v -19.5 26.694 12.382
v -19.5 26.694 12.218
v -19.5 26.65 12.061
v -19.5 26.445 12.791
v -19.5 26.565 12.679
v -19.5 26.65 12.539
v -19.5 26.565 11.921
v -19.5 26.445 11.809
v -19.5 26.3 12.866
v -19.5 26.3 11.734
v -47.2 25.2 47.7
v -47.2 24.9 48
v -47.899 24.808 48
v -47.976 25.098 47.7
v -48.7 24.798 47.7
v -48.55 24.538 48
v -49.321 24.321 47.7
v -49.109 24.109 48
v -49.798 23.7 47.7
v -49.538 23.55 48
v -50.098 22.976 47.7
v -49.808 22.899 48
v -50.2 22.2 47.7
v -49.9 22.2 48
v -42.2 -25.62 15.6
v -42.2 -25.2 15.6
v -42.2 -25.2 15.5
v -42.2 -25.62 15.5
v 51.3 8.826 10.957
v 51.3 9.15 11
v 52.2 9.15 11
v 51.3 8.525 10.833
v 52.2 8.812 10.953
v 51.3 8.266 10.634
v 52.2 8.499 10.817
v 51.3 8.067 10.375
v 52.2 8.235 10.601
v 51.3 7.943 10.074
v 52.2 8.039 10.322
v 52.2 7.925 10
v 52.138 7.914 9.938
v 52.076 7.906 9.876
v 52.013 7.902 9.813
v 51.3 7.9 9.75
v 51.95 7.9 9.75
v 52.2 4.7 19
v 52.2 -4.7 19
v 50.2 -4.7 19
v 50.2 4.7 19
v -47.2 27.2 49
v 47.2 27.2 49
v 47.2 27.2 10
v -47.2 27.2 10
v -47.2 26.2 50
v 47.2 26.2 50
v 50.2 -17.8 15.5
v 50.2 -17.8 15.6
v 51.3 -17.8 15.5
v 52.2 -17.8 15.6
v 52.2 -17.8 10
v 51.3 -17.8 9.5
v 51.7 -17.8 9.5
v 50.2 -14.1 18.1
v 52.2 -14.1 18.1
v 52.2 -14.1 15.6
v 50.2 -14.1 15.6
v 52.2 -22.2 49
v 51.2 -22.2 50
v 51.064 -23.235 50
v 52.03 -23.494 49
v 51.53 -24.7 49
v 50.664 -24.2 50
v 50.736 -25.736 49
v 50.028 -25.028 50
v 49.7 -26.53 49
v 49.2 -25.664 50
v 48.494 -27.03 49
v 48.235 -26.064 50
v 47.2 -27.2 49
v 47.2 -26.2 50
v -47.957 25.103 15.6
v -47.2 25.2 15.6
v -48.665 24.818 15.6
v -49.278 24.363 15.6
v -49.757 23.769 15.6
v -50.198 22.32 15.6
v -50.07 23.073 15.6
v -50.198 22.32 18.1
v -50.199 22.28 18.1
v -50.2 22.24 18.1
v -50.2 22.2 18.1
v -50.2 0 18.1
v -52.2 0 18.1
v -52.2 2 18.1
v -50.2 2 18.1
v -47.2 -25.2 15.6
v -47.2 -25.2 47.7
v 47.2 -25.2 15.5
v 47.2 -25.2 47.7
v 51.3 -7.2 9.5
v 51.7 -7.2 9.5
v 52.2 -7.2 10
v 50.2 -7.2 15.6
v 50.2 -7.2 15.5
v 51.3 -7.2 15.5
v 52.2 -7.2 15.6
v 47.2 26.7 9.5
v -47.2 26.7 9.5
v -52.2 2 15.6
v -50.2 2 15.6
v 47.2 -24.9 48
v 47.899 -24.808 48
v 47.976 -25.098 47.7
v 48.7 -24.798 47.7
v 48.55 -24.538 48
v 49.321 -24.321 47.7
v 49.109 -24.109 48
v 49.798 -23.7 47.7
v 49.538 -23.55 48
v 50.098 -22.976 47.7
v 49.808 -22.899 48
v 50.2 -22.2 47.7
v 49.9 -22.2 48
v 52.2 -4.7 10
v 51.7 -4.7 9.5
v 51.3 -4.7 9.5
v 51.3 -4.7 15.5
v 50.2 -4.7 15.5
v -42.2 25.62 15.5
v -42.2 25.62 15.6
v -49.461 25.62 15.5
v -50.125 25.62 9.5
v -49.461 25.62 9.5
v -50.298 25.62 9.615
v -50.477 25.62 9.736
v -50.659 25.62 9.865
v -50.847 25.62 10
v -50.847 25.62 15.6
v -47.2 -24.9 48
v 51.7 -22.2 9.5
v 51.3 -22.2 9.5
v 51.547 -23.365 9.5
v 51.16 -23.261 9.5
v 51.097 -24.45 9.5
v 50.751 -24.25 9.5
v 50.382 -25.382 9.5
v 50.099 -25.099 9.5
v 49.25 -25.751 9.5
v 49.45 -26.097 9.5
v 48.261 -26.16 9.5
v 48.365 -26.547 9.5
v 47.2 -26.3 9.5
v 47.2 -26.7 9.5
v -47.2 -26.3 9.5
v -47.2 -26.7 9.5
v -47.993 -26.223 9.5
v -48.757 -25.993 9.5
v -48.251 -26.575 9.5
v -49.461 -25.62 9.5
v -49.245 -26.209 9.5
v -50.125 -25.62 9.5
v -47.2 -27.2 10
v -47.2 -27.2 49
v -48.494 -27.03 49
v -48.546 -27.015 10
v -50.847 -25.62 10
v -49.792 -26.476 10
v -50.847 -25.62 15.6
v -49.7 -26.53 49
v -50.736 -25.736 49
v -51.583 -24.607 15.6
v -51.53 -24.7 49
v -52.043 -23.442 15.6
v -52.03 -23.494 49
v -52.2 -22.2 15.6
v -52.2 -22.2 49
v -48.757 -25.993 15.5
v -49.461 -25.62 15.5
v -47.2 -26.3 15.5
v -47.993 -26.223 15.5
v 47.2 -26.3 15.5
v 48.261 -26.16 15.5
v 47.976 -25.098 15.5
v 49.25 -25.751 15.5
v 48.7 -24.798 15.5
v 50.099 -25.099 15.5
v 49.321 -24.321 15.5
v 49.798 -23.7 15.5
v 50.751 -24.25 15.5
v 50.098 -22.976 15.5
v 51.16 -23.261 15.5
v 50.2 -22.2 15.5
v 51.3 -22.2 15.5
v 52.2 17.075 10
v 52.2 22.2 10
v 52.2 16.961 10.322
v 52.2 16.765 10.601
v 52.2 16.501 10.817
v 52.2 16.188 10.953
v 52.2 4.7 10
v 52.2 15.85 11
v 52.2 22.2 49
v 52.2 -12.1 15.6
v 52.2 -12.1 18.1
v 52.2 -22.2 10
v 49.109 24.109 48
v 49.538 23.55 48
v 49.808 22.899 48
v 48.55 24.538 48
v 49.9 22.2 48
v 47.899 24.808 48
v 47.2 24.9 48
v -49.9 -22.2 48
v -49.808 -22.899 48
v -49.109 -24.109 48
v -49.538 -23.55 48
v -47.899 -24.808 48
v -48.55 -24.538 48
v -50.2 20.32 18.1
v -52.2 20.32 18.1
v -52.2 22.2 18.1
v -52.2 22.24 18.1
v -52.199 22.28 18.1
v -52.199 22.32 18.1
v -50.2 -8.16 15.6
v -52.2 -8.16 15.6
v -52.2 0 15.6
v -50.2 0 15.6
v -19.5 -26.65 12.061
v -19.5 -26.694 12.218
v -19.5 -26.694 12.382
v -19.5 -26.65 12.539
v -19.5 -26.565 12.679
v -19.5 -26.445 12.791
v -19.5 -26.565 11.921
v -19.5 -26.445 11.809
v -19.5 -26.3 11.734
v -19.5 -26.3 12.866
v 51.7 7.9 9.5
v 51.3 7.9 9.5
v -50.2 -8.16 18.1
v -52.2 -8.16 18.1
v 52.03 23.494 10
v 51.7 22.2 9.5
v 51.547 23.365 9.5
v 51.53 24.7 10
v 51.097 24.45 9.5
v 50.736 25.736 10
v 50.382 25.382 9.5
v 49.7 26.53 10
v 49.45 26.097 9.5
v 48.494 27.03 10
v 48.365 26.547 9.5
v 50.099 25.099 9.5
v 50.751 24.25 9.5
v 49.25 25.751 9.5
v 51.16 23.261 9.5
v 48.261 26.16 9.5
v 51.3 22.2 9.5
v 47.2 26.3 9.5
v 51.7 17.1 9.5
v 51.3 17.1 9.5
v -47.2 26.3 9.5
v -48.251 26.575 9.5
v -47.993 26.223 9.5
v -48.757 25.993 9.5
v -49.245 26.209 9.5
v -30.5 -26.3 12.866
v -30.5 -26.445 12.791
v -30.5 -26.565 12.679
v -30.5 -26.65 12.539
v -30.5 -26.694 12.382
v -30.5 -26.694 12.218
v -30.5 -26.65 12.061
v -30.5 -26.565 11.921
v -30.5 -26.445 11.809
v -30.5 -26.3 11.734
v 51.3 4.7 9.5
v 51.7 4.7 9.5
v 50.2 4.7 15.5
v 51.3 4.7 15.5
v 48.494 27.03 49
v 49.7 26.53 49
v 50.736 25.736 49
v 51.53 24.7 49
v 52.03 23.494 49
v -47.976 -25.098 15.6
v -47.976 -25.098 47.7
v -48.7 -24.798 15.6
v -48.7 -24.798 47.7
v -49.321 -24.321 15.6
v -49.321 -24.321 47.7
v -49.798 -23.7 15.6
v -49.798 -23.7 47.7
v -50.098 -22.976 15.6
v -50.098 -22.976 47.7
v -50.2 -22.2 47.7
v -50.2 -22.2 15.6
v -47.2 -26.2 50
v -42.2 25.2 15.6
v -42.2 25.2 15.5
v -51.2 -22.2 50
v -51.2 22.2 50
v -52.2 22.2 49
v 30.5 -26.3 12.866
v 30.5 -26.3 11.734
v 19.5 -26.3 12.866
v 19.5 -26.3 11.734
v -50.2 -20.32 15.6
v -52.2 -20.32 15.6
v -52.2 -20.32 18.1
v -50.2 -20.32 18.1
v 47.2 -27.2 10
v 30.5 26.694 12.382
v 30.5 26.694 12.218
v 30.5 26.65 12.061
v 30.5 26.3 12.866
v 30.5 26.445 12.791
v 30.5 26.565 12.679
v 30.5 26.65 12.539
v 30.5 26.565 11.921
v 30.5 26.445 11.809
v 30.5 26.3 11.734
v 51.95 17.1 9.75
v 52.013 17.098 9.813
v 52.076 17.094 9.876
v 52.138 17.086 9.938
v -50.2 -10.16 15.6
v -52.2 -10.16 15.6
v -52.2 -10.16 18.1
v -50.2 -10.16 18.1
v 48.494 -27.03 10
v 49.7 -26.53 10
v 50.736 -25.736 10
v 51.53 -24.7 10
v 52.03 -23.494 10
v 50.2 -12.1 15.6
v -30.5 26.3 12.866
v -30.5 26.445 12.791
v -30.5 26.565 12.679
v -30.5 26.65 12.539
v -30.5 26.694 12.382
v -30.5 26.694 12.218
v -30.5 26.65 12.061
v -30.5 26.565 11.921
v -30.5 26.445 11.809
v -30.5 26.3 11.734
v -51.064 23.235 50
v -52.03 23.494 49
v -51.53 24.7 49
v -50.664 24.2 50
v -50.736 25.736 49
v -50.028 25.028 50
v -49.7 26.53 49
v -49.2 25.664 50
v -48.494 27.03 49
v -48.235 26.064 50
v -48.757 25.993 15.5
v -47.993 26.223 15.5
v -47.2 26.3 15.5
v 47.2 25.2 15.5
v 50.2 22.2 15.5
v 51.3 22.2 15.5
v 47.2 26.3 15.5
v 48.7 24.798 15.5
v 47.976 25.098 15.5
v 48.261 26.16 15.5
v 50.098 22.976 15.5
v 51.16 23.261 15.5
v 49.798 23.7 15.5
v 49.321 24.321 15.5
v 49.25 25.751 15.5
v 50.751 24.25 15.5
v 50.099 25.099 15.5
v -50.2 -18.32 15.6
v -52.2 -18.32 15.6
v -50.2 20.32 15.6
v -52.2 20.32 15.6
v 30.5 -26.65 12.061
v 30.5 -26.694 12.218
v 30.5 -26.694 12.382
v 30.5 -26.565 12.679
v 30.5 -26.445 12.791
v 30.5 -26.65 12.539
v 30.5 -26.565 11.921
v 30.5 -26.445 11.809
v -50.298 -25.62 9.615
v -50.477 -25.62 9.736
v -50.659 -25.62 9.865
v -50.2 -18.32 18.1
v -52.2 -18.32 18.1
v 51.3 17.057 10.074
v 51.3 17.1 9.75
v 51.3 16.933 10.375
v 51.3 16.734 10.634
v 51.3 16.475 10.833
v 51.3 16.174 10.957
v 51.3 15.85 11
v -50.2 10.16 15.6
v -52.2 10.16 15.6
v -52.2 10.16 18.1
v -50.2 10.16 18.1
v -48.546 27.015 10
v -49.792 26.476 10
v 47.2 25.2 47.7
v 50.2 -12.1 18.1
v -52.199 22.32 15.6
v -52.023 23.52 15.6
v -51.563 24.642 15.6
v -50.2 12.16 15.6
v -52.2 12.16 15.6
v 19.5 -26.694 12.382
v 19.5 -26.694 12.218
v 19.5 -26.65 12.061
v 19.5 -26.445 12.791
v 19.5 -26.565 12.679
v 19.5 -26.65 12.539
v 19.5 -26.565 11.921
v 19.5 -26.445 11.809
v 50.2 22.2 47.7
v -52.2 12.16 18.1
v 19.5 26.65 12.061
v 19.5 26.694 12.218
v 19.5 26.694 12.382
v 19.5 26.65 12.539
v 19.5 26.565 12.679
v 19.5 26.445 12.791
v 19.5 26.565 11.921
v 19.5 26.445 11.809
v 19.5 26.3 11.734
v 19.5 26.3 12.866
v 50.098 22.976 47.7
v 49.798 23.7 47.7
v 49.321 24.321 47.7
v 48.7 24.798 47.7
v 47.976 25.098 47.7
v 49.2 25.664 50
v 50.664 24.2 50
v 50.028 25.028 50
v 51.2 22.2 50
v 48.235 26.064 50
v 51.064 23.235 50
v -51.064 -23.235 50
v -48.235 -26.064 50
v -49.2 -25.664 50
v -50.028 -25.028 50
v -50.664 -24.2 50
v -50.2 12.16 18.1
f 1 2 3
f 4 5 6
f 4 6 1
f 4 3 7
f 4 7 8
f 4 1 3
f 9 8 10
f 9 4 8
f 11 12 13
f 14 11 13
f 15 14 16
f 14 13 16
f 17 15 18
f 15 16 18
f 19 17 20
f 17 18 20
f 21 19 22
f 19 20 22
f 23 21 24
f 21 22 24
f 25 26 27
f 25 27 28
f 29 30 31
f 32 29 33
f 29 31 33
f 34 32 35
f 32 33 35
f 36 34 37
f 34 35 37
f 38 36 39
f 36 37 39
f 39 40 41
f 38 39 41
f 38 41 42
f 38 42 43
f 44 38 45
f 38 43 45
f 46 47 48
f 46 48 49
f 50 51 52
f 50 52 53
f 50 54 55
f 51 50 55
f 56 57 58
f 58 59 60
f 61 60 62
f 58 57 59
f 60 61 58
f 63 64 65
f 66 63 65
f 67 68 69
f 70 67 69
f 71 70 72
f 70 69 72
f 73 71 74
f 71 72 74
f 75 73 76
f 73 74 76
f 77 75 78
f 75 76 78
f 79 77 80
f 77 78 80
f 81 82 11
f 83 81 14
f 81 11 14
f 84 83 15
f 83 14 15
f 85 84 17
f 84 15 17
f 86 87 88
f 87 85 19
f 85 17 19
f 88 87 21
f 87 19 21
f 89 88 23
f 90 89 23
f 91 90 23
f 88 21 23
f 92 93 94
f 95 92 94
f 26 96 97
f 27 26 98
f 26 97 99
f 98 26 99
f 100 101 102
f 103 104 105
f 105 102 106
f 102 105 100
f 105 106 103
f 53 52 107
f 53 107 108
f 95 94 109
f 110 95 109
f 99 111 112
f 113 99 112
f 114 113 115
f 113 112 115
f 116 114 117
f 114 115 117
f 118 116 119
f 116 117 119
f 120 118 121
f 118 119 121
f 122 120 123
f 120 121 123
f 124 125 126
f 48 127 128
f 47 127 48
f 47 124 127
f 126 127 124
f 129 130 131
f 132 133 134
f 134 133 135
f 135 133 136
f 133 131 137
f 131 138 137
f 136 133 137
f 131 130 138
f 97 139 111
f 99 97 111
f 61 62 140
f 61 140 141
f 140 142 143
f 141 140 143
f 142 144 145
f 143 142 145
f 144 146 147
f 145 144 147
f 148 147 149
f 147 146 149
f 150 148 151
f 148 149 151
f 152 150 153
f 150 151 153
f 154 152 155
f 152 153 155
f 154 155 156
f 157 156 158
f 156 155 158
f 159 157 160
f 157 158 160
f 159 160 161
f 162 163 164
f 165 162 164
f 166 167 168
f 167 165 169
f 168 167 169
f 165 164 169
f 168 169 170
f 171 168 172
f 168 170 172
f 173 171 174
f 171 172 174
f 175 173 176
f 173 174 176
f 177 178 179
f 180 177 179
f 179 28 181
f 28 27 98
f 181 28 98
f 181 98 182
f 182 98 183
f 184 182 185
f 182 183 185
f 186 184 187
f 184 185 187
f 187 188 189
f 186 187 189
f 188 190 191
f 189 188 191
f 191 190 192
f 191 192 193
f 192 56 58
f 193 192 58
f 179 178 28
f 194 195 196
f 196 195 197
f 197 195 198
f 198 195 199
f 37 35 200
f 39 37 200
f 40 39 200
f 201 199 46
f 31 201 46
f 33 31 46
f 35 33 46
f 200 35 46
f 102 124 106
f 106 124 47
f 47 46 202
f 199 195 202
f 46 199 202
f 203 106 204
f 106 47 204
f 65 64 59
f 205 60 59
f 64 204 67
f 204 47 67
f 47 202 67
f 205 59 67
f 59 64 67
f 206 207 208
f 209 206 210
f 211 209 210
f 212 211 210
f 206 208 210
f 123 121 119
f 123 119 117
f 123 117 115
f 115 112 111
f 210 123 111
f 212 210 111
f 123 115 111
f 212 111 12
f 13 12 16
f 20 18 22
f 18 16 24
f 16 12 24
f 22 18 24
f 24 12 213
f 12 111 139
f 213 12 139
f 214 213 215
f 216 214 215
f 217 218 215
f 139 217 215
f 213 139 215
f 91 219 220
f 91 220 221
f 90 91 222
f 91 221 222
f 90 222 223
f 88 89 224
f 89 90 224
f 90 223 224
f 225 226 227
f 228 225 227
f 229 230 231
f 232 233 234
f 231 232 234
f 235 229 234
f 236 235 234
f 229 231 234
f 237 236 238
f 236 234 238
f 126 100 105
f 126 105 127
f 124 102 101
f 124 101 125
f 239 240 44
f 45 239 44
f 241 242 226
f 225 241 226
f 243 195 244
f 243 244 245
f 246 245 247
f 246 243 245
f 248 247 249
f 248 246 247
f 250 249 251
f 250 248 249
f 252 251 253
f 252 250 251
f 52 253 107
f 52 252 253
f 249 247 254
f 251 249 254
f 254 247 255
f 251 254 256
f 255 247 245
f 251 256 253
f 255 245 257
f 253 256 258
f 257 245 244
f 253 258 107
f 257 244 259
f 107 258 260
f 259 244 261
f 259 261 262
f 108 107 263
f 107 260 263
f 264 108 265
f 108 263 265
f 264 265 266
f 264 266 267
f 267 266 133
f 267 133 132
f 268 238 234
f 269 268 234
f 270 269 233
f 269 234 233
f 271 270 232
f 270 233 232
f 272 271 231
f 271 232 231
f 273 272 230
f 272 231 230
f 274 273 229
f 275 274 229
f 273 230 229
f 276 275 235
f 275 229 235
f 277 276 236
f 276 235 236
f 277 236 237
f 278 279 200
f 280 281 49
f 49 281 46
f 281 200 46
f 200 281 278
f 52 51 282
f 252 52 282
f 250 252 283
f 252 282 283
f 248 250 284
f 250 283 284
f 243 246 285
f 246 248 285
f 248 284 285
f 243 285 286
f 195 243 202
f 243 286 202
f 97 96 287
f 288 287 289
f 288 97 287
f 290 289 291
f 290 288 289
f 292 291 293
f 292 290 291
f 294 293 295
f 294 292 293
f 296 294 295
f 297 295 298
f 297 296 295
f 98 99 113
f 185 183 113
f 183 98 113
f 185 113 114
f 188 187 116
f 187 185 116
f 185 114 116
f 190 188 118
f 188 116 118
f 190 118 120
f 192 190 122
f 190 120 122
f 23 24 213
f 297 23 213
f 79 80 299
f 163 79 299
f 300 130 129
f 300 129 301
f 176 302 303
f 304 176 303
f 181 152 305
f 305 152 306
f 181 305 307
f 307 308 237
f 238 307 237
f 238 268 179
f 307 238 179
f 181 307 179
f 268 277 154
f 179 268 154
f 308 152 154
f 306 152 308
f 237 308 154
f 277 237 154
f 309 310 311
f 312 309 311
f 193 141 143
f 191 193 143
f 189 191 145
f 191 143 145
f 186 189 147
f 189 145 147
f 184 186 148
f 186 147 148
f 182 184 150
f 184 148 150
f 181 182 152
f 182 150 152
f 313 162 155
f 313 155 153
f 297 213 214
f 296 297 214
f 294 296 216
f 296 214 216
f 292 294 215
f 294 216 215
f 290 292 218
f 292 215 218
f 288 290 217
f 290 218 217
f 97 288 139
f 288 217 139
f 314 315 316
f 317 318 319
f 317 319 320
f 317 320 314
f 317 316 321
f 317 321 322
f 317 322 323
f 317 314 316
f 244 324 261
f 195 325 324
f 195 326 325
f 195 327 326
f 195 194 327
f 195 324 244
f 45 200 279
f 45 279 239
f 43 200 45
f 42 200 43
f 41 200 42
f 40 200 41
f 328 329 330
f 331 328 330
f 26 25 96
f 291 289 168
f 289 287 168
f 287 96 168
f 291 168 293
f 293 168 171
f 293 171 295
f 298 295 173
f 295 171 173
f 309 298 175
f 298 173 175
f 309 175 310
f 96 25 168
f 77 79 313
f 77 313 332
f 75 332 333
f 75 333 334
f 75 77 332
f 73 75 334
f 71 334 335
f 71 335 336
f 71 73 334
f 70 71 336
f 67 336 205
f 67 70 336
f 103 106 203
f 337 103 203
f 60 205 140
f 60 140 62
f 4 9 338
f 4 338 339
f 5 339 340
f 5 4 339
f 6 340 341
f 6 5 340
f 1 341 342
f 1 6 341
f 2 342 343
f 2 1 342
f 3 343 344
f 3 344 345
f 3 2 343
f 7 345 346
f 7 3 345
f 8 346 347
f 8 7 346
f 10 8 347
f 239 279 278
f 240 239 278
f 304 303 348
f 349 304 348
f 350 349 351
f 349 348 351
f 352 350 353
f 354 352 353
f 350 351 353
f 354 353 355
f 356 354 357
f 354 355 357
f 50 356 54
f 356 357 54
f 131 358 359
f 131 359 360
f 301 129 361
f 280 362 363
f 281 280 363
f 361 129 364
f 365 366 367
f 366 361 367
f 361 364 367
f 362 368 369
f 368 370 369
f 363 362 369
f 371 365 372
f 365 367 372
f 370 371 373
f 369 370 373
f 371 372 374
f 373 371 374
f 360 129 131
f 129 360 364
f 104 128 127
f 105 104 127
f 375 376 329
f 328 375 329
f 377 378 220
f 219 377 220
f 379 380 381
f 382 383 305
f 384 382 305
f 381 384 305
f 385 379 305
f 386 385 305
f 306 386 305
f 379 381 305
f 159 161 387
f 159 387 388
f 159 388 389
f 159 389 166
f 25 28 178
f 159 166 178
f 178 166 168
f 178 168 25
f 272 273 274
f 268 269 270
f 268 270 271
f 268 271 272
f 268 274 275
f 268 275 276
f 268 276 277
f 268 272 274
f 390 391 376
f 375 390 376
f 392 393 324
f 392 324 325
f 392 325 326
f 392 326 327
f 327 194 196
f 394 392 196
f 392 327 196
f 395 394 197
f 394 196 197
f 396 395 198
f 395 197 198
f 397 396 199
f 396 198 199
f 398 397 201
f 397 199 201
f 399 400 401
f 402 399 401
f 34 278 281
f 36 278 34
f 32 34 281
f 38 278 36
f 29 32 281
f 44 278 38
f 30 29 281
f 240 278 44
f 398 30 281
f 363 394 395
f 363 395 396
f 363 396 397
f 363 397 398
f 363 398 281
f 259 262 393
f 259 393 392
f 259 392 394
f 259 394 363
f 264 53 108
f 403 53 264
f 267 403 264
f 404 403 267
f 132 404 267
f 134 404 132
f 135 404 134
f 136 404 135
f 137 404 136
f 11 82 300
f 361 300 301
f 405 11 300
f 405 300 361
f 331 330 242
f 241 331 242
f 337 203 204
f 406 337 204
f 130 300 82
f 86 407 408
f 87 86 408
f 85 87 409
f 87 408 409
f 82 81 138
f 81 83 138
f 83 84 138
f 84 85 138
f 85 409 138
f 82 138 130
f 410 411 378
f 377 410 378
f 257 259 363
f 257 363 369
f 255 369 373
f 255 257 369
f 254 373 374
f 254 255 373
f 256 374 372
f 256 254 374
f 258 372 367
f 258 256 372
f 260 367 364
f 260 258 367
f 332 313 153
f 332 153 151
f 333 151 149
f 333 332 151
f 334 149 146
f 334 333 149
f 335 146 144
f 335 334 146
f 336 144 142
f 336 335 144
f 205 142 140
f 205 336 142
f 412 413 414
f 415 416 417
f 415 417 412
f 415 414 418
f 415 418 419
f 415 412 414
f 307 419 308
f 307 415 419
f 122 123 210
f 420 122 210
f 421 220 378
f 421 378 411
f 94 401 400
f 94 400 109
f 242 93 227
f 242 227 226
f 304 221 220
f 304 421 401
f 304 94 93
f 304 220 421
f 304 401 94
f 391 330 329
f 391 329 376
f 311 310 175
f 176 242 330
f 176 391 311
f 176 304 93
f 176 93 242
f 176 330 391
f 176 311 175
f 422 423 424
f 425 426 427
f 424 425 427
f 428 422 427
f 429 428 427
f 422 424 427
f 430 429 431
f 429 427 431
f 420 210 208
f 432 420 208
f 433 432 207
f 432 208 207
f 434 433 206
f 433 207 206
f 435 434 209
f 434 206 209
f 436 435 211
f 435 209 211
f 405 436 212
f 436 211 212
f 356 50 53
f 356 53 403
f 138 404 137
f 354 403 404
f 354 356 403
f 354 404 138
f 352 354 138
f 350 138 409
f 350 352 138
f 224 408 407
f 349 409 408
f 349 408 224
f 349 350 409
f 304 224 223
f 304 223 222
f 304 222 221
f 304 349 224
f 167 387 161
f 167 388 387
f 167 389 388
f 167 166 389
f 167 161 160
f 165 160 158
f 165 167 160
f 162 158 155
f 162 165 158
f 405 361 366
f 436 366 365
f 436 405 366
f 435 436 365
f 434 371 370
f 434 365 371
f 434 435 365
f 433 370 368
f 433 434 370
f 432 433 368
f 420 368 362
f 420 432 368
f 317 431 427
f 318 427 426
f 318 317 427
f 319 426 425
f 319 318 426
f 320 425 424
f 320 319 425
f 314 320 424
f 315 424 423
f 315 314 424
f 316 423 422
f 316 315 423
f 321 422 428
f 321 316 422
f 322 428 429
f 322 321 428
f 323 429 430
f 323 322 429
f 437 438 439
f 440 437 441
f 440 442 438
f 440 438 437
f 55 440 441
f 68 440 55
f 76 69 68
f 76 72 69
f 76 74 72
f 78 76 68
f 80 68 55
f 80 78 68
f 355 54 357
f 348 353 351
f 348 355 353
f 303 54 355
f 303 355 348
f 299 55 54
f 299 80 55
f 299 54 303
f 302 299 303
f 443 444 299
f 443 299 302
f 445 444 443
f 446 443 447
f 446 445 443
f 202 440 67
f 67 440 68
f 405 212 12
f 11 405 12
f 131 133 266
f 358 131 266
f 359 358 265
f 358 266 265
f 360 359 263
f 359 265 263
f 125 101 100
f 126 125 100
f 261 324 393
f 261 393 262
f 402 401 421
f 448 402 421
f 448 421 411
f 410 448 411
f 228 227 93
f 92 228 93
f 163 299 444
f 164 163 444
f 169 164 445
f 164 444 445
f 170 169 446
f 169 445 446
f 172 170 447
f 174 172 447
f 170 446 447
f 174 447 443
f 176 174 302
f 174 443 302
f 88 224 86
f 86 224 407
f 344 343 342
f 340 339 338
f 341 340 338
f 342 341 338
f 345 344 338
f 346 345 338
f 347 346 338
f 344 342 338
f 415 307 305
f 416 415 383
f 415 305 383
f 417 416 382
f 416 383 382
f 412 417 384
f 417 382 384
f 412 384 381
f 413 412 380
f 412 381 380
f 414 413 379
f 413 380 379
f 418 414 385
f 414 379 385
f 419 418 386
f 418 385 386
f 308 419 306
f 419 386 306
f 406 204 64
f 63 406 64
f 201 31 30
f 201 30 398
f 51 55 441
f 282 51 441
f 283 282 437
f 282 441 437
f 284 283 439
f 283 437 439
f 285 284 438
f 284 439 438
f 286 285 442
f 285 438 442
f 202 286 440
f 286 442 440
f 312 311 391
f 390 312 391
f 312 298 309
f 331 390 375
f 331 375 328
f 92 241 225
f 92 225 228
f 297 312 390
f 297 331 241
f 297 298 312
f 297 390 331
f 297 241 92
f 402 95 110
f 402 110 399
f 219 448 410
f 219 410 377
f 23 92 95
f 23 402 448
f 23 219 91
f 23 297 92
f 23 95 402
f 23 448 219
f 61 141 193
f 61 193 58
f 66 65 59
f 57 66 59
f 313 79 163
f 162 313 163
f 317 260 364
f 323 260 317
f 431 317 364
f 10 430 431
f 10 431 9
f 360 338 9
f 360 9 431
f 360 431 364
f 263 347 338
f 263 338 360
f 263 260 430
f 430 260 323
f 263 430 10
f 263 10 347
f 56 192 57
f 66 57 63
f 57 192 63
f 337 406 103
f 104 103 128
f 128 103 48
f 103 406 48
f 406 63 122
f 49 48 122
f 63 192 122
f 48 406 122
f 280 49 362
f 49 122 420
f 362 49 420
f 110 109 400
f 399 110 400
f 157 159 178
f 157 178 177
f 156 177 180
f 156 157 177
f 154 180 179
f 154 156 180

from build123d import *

# Parameters (mm, degrees)
PAD021_DEPTH                  = 40.5
POCKET064_DEPTH               = 6
PAD021_MIRRORED041_2_DEPTH    = 40.5
POCKET064_MIRRORED041_2_DEPTH = 6
PAD022_DEPTH                  = 2
PAD022_MIRRORED032_2_DEPTH    = 2
POCKET055_DEPTH               = 30.5
PAD018_DEPTH                  = 19.5
PAD018_FACE36_W               = 39
PAD018_FACE36_H               = 1.2
POCKET061_DEPTH               = 0.2
CHAMFER032_SIZE               = 0.5
CHAMFER030_SIZE               = 1
CHAMFER027_SIZE               = 0.2999
POCKET058_DEPTH               = 10
SKETCH064_W                   = 9.4
SKETCH064_H                   = 50
POCKET070_DEPTH               = 15
POCKET059_DEPTH               = 5
POCKET069_DEPTH               = 10
POCKET062_DEPTH               = 10
POCKET051_DEPTH               = 10
POCKET067_DEPTH               = 10
POCKET054_DEPTH               = 10


with BuildPart() as part:
    # Sketch081 (on DatumPlane) → Pad021 (new body)
    with BuildSketch(Plane.XY.offset(50)):
        with BuildLine():
            ThreePointArc((-47.2, 27.2), (-50.735534, 25.735534), (-52.2, 22.2))
            Line((-52.2, 0), (-52.2, 22.2))
            Line((-50.2, 0), (-52.2, 0))
            Line((-50.2, 22.2), (-50.2, 0))
            ThreePointArc((-47.2, 25.2), (-49.32132, 24.32132), (-50.2, 22.2))
            Line((0, 25.2), (-47.2, 25.2))
            Line((0, 27.2), (0, 25.2))
            Line((-47.2, 27.2), (0, 27.2))
        make_face()
    pad021 = extrude(amount=-PAD021_DEPTH)

    # Sketch080 (on Face10 of Pad021) → Pocket064 (cut)
    with BuildSketch(Plane(origin=(0, 0, 9.5), x_dir=(1, 0, 0), z_dir=(0, 0, -1))):
        with BuildLine():
            ThreePointArc((-50.2, -22.2), (-49.32132, -24.32132), (-47.2, -25.2))
            Line((-47.2, -25.2), (0, -25.2))
            Line((0, -25.2), (0, -26.3))
            Line((0, -26.3), (-47.2, -26.3))
            ThreePointArc((-51.3, -22.2), (-50.099138, -25.099138), (-47.2, -26.3))
            Line((-51.3, 0), (-51.3, -22.2))
            Line((-50.2, 0), (-51.3, 0))
            Line((-50.2, -22.2), (-50.2, 0))
        make_face()
    pocket064 = extrude(amount=-POCKET064_DEPTH, mode=Mode.SUBTRACT)

    # Sketch081 Mirrored041 2 → Pad021 Mirrored041 2 (add)
    with BuildSketch(Plane(origin=(0, 0, 50), x_dir=(-1, 0, 0), z_dir=(0, 0, -1))):
        with BuildLine():
            ThreePointArc((-47.2, 27.2), (-50.735534, 25.735534), (-52.2, 22.2))
            Line((-52.2, 0), (-52.2, 22.2))
            Line((-50.2, 0), (-52.2, 0))
            Line((-50.2, 22.2), (-50.2, 0))
            ThreePointArc((-47.2, 25.2), (-49.32132, 24.32132), (-50.2, 22.2))
            Line((0, 25.2), (-47.2, 25.2))
            Line((0, 27.2), (0, 25.2))
            Line((-47.2, 27.2), (0, 27.2))
        make_face()
    pad021_mirrored041_2 = extrude(amount=PAD021_MIRRORED041_2_DEPTH)

    # Sketch080 Mirrored041 2 → Pocket064 Mirrored041 2 (cut)
    with BuildSketch(Plane(origin=(0, 0, 9.5), x_dir=(-1, 0, 0), z_dir=(0, 0, 1))):
        with BuildLine():
            ThreePointArc((-50.2, -22.2), (-49.32132, -24.32132), (-47.2, -25.2))
            Line((-47.2, -25.2), (0, -25.2))
            Line((0, -25.2), (0, -26.3))
            Line((0, -26.3), (-47.2, -26.3))
            ThreePointArc((-51.3, -22.2), (-50.099138, -25.099138), (-47.2, -26.3))
            Line((-51.3, 0), (-51.3, -22.2))
            Line((-50.2, 0), (-51.3, 0))
            Line((-50.2, -22.2), (-50.2, 0))
        make_face()
    pocket064_mirrored041_2 = extrude(amount=POCKET064_MIRRORED041_2_DEPTH, mode=Mode.SUBTRACT)

    # Mirrored036: Pad021, Pocket064, Pad021 Mirrored041 2, Pocket064 Mirrored041 2 across Sketch081 H_Axis
    add(pad021.mirror(Plane(origin=(0, 0, 50), x_dir=(0, 0, 1), z_dir=(0, 1, 0))))
    add(pocket064.mirror(Plane(origin=(0, 0, 50), x_dir=(0, 0, 1), z_dir=(0, 1, 0))), mode=Mode.SUBTRACT)
    add(pad021_mirrored041_2.mirror(Plane(origin=(0, 0, 50), x_dir=(0, 0, 1), z_dir=(0, 1, 0))))
    add(pocket064_mirrored041_2.mirror(Plane(origin=(0, 0, 50), x_dir=(0, 0, 1), z_dir=(0, 1, 0))), mode=Mode.SUBTRACT)

    # Sketch058 (on DatumPlane) → Pad022 (join)
    with BuildSketch(Plane.XY.offset(50)):
        with BuildLine():
            ThreePointArc((-47.2, 25.2), (-49.32132, 24.32132), (-50.2, 22.2))
            Line((-50.2, 22.2), (-50.2, 0))
            Line((-50.2, 0), (0, 0))
            Line((0, 0), (0, 25.2))
            Line((0, 25.2), (-47.2, 25.2))
        make_face()
    pad022 = extrude(amount=-PAD022_DEPTH)

    # Sketch058 Mirrored032 2 → Pad022 Mirrored032 2 (add)
    with BuildSketch(Plane(origin=(0, 0, 50), x_dir=(-1, 0, 0), z_dir=(0, 0, -1))):
        with BuildLine():
            ThreePointArc((-47.2, 25.2), (-49.32132, 24.32132), (-50.2, 22.2))
            Line((-50.2, 22.2), (-50.2, 0))
            Line((-50.2, 0), (0, 0))
            Line((0, 0), (0, 25.2))
            Line((0, 25.2), (-47.2, 25.2))
        make_face()
    pad022_mirrored032_2 = extrude(amount=PAD022_MIRRORED032_2_DEPTH)

    # Mirrored039: Pad022, Pad022 Mirrored032 2 across Sketch058 H_Axis
    add(pad022.mirror(Plane(origin=(0, 0, 50), x_dir=(0, 0, 1), z_dir=(0, 1, 0))))
    add(pad022_mirrored032_2.mirror(Plane(origin=(0, 0, 50), x_dir=(0, 0, 1), z_dir=(0, 1, 0))))

    # Sketch067 → Pocket055 (cut, symmetric)
    with BuildSketch(Plane.YZ):
        with BuildLine():
            ThreePointArc((-26.1, 12.9), (-26.7, 12.3), (-26.1, 11.7))
            Line((-26.1, 12.9), (-26.1, 11.7))
        make_face()
    pocket055 = extrude(amount=POCKET055_DEPTH, both=True, mode=Mode.SUBTRACT)

    # Sketch067 → Pad018 (join, symmetric)
    with BuildSketch(Plane.YZ):
        with BuildLine():
            ThreePointArc((-26.1, 12.9), (-26.7, 12.3), (-26.1, 11.7))
            Line((-26.1, 12.9), (-26.1, 11.7))
        make_face()
    pad018 = extrude(amount=PAD018_DEPTH, both=True)

    # Pad018 Face36 → Pocket061 (cut)
    with BuildSketch(Plane(origin=(0, -26.1, 12.3), x_dir=(1, 0, 0), z_dir=(0, 1, 0))):
        Rectangle(PAD018_FACE36_W, PAD018_FACE36_H)
    pocket061 = extrude(amount=-POCKET061_DEPTH, mode=Mode.SUBTRACT)

    # Mirrored040: Pocket055, Pad018, Pocket061 across Sketch067 V_Axis
    add(pocket055.mirror(Plane(origin=(0, 0, 0), x_dir=(1, 0, 0), z_dir=(0, 1, 0))), mode=Mode.SUBTRACT)
    add(pad018.mirror(Plane(origin=(0, 0, 0), x_dir=(1, 0, 0), z_dir=(0, 1, 0))))
    add(pocket061.mirror(Plane(origin=(0, 0, 0), x_dir=(1, 0, 0), z_dir=(0, 1, 0))), mode=Mode.SUBTRACT)

    # Chamfer032
    chamfer032_edges = [part.edges().sort_by_distance(p)[0] for p in [
        (0, -27.2, 9.5),
    ]]
    chamfer(chamfer032_edges, length=CHAMFER032_SIZE)

    # Chamfer030
    chamfer030_edges = [part.edges().sort_by_distance(p)[0] for p in [
        (0, -27.2, 50),
    ]]
    chamfer(chamfer030_edges, length=CHAMFER030_SIZE)

    # Chamfer027
    chamfer027_edges = [part.edges().sort_by_distance(p)[0] for p in [
        (50.2, 0, 48),
    ]]
    chamfer(chamfer027_edges, length=CHAMFER027_SIZE)

    # Sketch079 (on DatumPlane) → Pocket058 (cut)
    with BuildSketch(Plane.YZ.offset(52.2)):
        Polygon((-7.2, 7.6), (-7.2, 15.6), (-12.1, 15.6), (-12.1, 18.1), (-14.1, 18.1), (-14.1, 15.6), (-17.8, 15.6), (-17.8, 7.6), (-17.8, 2.6), (-7.2, 2.6), align=None)
    extrude(amount=-POCKET058_DEPTH, mode=Mode.SUBTRACT)

    # Sketch064 (on DatumPlane) → Pocket070 (cut)
    with BuildSketch(Plane.YZ.offset(52.2)):
        with Locations((0, -6)):
            Rectangle(SKETCH064_W, SKETCH064_H)
    extrude(amount=-POCKET070_DEPTH, mode=Mode.SUBTRACT)

    # Sketch065 (on DatumPlane) → Pocket059 (cut)
    with BuildSketch(Plane.YZ.offset(52.2)):
        with BuildLine():
            Line((7.9, -40.25), (7.9, 9.75))
            ThreePointArc((9.15, 11), (8.266117, 10.633883), (7.9, 9.75))
            Line((9.15, 11), (15.85, 11))
            ThreePointArc((17.1, 9.75), (16.733883, 10.633883), (15.85, 11))
            Line((17.1, 9.75), (17.1, -40.25))
            Line((7.9, -40.25), (17.1, -40.25))
        make_face()
    extrude(amount=-POCKET059_DEPTH, mode=Mode.SUBTRACT)

    # Sketch078 (on DatumPlane) → Pocket069 (cut)
    with BuildSketch(Plane(origin=(-52.2, 0, 0), x_dir=(0, -1, 0), z_dir=(-1, 0, 0))):
        Polygon((-15.02, 7.6), (-15.02, 15.6), (-20.32, 15.6), (-20.32, 18.1), (-22.32, 18.1), (-22.32, 15.6), (-25.62, 15.6), (-25.62, 7.6), (-25.62, -42.4), (-15.02, -42.4), align=None)
    extrude(amount=-POCKET069_DEPTH, mode=Mode.SUBTRACT)

    # Sketch075 (on DatumPlane) → Pocket062 (cut)
    with BuildSketch(Plane(origin=(-52.2, 0, 0), x_dir=(0, -1, 0), z_dir=(-1, 0, 0))):
        Polygon((-4.86, 7.6), (-4.86, 15.6), (-10.16, 15.6), (-10.16, 18.1), (-12.16, 18.1), (-12.16, 15.6), (-15.46, 15.6), (-15.46, 7.6), (-15.46, -42.4), (-4.86, -42.4), align=None)
    extrude(amount=-POCKET062_DEPTH, mode=Mode.SUBTRACT)

    # Sketch073 (on DatumPlane) → Pocket051 (cut)
    with BuildSketch(Plane(origin=(-52.2, 0, 0), x_dir=(0, -1, 0), z_dir=(-1, 0, 0))):
        Polygon((5.3, 7.6), (5.3, 15.6), (0, 15.6), (0, 18.1), (-2, 18.1), (-2, 15.6), (-5.3, 15.6), (-5.3, 7.6), (-5.3, -42.4), (5.3, -42.4), align=None)
    extrude(amount=-POCKET051_DEPTH, mode=Mode.SUBTRACT)

    # Sketch077 (on DatumPlane) → Pocket067 (cut)
    with BuildSketch(Plane(origin=(-52.2, 0, 0), x_dir=(0, -1, 0), z_dir=(-1, 0, 0))):
        Polygon((15.46, 7.6), (15.46, 15.6), (10.16, 15.6), (10.16, 18.1), (8.16, 18.1), (8.16, 15.6), (4.86, 15.6), (4.86, 7.6), (4.86, -42.4), (15.46, -42.4), align=None)
    extrude(amount=-POCKET067_DEPTH, mode=Mode.SUBTRACT)

    # Sketch066 (on DatumPlane) → Pocket054 (cut)
    with BuildSketch(Plane(origin=(-52.2, 0, 0), x_dir=(0, -1, 0), z_dir=(-1, 0, 0))):
        Polygon((25.62, 7.6), (25.62, 15.6), (20.32, 15.6), (20.32, 18.1), (18.32, 18.1), (18.32, 15.6), (15.02, 15.6), (15.02, 7.6), (15.02, -42.4), (25.62, -42.4), align=None)
    extrude(amount=-POCKET054_DEPTH, mode=Mode.SUBTRACT)


solid = part.part
